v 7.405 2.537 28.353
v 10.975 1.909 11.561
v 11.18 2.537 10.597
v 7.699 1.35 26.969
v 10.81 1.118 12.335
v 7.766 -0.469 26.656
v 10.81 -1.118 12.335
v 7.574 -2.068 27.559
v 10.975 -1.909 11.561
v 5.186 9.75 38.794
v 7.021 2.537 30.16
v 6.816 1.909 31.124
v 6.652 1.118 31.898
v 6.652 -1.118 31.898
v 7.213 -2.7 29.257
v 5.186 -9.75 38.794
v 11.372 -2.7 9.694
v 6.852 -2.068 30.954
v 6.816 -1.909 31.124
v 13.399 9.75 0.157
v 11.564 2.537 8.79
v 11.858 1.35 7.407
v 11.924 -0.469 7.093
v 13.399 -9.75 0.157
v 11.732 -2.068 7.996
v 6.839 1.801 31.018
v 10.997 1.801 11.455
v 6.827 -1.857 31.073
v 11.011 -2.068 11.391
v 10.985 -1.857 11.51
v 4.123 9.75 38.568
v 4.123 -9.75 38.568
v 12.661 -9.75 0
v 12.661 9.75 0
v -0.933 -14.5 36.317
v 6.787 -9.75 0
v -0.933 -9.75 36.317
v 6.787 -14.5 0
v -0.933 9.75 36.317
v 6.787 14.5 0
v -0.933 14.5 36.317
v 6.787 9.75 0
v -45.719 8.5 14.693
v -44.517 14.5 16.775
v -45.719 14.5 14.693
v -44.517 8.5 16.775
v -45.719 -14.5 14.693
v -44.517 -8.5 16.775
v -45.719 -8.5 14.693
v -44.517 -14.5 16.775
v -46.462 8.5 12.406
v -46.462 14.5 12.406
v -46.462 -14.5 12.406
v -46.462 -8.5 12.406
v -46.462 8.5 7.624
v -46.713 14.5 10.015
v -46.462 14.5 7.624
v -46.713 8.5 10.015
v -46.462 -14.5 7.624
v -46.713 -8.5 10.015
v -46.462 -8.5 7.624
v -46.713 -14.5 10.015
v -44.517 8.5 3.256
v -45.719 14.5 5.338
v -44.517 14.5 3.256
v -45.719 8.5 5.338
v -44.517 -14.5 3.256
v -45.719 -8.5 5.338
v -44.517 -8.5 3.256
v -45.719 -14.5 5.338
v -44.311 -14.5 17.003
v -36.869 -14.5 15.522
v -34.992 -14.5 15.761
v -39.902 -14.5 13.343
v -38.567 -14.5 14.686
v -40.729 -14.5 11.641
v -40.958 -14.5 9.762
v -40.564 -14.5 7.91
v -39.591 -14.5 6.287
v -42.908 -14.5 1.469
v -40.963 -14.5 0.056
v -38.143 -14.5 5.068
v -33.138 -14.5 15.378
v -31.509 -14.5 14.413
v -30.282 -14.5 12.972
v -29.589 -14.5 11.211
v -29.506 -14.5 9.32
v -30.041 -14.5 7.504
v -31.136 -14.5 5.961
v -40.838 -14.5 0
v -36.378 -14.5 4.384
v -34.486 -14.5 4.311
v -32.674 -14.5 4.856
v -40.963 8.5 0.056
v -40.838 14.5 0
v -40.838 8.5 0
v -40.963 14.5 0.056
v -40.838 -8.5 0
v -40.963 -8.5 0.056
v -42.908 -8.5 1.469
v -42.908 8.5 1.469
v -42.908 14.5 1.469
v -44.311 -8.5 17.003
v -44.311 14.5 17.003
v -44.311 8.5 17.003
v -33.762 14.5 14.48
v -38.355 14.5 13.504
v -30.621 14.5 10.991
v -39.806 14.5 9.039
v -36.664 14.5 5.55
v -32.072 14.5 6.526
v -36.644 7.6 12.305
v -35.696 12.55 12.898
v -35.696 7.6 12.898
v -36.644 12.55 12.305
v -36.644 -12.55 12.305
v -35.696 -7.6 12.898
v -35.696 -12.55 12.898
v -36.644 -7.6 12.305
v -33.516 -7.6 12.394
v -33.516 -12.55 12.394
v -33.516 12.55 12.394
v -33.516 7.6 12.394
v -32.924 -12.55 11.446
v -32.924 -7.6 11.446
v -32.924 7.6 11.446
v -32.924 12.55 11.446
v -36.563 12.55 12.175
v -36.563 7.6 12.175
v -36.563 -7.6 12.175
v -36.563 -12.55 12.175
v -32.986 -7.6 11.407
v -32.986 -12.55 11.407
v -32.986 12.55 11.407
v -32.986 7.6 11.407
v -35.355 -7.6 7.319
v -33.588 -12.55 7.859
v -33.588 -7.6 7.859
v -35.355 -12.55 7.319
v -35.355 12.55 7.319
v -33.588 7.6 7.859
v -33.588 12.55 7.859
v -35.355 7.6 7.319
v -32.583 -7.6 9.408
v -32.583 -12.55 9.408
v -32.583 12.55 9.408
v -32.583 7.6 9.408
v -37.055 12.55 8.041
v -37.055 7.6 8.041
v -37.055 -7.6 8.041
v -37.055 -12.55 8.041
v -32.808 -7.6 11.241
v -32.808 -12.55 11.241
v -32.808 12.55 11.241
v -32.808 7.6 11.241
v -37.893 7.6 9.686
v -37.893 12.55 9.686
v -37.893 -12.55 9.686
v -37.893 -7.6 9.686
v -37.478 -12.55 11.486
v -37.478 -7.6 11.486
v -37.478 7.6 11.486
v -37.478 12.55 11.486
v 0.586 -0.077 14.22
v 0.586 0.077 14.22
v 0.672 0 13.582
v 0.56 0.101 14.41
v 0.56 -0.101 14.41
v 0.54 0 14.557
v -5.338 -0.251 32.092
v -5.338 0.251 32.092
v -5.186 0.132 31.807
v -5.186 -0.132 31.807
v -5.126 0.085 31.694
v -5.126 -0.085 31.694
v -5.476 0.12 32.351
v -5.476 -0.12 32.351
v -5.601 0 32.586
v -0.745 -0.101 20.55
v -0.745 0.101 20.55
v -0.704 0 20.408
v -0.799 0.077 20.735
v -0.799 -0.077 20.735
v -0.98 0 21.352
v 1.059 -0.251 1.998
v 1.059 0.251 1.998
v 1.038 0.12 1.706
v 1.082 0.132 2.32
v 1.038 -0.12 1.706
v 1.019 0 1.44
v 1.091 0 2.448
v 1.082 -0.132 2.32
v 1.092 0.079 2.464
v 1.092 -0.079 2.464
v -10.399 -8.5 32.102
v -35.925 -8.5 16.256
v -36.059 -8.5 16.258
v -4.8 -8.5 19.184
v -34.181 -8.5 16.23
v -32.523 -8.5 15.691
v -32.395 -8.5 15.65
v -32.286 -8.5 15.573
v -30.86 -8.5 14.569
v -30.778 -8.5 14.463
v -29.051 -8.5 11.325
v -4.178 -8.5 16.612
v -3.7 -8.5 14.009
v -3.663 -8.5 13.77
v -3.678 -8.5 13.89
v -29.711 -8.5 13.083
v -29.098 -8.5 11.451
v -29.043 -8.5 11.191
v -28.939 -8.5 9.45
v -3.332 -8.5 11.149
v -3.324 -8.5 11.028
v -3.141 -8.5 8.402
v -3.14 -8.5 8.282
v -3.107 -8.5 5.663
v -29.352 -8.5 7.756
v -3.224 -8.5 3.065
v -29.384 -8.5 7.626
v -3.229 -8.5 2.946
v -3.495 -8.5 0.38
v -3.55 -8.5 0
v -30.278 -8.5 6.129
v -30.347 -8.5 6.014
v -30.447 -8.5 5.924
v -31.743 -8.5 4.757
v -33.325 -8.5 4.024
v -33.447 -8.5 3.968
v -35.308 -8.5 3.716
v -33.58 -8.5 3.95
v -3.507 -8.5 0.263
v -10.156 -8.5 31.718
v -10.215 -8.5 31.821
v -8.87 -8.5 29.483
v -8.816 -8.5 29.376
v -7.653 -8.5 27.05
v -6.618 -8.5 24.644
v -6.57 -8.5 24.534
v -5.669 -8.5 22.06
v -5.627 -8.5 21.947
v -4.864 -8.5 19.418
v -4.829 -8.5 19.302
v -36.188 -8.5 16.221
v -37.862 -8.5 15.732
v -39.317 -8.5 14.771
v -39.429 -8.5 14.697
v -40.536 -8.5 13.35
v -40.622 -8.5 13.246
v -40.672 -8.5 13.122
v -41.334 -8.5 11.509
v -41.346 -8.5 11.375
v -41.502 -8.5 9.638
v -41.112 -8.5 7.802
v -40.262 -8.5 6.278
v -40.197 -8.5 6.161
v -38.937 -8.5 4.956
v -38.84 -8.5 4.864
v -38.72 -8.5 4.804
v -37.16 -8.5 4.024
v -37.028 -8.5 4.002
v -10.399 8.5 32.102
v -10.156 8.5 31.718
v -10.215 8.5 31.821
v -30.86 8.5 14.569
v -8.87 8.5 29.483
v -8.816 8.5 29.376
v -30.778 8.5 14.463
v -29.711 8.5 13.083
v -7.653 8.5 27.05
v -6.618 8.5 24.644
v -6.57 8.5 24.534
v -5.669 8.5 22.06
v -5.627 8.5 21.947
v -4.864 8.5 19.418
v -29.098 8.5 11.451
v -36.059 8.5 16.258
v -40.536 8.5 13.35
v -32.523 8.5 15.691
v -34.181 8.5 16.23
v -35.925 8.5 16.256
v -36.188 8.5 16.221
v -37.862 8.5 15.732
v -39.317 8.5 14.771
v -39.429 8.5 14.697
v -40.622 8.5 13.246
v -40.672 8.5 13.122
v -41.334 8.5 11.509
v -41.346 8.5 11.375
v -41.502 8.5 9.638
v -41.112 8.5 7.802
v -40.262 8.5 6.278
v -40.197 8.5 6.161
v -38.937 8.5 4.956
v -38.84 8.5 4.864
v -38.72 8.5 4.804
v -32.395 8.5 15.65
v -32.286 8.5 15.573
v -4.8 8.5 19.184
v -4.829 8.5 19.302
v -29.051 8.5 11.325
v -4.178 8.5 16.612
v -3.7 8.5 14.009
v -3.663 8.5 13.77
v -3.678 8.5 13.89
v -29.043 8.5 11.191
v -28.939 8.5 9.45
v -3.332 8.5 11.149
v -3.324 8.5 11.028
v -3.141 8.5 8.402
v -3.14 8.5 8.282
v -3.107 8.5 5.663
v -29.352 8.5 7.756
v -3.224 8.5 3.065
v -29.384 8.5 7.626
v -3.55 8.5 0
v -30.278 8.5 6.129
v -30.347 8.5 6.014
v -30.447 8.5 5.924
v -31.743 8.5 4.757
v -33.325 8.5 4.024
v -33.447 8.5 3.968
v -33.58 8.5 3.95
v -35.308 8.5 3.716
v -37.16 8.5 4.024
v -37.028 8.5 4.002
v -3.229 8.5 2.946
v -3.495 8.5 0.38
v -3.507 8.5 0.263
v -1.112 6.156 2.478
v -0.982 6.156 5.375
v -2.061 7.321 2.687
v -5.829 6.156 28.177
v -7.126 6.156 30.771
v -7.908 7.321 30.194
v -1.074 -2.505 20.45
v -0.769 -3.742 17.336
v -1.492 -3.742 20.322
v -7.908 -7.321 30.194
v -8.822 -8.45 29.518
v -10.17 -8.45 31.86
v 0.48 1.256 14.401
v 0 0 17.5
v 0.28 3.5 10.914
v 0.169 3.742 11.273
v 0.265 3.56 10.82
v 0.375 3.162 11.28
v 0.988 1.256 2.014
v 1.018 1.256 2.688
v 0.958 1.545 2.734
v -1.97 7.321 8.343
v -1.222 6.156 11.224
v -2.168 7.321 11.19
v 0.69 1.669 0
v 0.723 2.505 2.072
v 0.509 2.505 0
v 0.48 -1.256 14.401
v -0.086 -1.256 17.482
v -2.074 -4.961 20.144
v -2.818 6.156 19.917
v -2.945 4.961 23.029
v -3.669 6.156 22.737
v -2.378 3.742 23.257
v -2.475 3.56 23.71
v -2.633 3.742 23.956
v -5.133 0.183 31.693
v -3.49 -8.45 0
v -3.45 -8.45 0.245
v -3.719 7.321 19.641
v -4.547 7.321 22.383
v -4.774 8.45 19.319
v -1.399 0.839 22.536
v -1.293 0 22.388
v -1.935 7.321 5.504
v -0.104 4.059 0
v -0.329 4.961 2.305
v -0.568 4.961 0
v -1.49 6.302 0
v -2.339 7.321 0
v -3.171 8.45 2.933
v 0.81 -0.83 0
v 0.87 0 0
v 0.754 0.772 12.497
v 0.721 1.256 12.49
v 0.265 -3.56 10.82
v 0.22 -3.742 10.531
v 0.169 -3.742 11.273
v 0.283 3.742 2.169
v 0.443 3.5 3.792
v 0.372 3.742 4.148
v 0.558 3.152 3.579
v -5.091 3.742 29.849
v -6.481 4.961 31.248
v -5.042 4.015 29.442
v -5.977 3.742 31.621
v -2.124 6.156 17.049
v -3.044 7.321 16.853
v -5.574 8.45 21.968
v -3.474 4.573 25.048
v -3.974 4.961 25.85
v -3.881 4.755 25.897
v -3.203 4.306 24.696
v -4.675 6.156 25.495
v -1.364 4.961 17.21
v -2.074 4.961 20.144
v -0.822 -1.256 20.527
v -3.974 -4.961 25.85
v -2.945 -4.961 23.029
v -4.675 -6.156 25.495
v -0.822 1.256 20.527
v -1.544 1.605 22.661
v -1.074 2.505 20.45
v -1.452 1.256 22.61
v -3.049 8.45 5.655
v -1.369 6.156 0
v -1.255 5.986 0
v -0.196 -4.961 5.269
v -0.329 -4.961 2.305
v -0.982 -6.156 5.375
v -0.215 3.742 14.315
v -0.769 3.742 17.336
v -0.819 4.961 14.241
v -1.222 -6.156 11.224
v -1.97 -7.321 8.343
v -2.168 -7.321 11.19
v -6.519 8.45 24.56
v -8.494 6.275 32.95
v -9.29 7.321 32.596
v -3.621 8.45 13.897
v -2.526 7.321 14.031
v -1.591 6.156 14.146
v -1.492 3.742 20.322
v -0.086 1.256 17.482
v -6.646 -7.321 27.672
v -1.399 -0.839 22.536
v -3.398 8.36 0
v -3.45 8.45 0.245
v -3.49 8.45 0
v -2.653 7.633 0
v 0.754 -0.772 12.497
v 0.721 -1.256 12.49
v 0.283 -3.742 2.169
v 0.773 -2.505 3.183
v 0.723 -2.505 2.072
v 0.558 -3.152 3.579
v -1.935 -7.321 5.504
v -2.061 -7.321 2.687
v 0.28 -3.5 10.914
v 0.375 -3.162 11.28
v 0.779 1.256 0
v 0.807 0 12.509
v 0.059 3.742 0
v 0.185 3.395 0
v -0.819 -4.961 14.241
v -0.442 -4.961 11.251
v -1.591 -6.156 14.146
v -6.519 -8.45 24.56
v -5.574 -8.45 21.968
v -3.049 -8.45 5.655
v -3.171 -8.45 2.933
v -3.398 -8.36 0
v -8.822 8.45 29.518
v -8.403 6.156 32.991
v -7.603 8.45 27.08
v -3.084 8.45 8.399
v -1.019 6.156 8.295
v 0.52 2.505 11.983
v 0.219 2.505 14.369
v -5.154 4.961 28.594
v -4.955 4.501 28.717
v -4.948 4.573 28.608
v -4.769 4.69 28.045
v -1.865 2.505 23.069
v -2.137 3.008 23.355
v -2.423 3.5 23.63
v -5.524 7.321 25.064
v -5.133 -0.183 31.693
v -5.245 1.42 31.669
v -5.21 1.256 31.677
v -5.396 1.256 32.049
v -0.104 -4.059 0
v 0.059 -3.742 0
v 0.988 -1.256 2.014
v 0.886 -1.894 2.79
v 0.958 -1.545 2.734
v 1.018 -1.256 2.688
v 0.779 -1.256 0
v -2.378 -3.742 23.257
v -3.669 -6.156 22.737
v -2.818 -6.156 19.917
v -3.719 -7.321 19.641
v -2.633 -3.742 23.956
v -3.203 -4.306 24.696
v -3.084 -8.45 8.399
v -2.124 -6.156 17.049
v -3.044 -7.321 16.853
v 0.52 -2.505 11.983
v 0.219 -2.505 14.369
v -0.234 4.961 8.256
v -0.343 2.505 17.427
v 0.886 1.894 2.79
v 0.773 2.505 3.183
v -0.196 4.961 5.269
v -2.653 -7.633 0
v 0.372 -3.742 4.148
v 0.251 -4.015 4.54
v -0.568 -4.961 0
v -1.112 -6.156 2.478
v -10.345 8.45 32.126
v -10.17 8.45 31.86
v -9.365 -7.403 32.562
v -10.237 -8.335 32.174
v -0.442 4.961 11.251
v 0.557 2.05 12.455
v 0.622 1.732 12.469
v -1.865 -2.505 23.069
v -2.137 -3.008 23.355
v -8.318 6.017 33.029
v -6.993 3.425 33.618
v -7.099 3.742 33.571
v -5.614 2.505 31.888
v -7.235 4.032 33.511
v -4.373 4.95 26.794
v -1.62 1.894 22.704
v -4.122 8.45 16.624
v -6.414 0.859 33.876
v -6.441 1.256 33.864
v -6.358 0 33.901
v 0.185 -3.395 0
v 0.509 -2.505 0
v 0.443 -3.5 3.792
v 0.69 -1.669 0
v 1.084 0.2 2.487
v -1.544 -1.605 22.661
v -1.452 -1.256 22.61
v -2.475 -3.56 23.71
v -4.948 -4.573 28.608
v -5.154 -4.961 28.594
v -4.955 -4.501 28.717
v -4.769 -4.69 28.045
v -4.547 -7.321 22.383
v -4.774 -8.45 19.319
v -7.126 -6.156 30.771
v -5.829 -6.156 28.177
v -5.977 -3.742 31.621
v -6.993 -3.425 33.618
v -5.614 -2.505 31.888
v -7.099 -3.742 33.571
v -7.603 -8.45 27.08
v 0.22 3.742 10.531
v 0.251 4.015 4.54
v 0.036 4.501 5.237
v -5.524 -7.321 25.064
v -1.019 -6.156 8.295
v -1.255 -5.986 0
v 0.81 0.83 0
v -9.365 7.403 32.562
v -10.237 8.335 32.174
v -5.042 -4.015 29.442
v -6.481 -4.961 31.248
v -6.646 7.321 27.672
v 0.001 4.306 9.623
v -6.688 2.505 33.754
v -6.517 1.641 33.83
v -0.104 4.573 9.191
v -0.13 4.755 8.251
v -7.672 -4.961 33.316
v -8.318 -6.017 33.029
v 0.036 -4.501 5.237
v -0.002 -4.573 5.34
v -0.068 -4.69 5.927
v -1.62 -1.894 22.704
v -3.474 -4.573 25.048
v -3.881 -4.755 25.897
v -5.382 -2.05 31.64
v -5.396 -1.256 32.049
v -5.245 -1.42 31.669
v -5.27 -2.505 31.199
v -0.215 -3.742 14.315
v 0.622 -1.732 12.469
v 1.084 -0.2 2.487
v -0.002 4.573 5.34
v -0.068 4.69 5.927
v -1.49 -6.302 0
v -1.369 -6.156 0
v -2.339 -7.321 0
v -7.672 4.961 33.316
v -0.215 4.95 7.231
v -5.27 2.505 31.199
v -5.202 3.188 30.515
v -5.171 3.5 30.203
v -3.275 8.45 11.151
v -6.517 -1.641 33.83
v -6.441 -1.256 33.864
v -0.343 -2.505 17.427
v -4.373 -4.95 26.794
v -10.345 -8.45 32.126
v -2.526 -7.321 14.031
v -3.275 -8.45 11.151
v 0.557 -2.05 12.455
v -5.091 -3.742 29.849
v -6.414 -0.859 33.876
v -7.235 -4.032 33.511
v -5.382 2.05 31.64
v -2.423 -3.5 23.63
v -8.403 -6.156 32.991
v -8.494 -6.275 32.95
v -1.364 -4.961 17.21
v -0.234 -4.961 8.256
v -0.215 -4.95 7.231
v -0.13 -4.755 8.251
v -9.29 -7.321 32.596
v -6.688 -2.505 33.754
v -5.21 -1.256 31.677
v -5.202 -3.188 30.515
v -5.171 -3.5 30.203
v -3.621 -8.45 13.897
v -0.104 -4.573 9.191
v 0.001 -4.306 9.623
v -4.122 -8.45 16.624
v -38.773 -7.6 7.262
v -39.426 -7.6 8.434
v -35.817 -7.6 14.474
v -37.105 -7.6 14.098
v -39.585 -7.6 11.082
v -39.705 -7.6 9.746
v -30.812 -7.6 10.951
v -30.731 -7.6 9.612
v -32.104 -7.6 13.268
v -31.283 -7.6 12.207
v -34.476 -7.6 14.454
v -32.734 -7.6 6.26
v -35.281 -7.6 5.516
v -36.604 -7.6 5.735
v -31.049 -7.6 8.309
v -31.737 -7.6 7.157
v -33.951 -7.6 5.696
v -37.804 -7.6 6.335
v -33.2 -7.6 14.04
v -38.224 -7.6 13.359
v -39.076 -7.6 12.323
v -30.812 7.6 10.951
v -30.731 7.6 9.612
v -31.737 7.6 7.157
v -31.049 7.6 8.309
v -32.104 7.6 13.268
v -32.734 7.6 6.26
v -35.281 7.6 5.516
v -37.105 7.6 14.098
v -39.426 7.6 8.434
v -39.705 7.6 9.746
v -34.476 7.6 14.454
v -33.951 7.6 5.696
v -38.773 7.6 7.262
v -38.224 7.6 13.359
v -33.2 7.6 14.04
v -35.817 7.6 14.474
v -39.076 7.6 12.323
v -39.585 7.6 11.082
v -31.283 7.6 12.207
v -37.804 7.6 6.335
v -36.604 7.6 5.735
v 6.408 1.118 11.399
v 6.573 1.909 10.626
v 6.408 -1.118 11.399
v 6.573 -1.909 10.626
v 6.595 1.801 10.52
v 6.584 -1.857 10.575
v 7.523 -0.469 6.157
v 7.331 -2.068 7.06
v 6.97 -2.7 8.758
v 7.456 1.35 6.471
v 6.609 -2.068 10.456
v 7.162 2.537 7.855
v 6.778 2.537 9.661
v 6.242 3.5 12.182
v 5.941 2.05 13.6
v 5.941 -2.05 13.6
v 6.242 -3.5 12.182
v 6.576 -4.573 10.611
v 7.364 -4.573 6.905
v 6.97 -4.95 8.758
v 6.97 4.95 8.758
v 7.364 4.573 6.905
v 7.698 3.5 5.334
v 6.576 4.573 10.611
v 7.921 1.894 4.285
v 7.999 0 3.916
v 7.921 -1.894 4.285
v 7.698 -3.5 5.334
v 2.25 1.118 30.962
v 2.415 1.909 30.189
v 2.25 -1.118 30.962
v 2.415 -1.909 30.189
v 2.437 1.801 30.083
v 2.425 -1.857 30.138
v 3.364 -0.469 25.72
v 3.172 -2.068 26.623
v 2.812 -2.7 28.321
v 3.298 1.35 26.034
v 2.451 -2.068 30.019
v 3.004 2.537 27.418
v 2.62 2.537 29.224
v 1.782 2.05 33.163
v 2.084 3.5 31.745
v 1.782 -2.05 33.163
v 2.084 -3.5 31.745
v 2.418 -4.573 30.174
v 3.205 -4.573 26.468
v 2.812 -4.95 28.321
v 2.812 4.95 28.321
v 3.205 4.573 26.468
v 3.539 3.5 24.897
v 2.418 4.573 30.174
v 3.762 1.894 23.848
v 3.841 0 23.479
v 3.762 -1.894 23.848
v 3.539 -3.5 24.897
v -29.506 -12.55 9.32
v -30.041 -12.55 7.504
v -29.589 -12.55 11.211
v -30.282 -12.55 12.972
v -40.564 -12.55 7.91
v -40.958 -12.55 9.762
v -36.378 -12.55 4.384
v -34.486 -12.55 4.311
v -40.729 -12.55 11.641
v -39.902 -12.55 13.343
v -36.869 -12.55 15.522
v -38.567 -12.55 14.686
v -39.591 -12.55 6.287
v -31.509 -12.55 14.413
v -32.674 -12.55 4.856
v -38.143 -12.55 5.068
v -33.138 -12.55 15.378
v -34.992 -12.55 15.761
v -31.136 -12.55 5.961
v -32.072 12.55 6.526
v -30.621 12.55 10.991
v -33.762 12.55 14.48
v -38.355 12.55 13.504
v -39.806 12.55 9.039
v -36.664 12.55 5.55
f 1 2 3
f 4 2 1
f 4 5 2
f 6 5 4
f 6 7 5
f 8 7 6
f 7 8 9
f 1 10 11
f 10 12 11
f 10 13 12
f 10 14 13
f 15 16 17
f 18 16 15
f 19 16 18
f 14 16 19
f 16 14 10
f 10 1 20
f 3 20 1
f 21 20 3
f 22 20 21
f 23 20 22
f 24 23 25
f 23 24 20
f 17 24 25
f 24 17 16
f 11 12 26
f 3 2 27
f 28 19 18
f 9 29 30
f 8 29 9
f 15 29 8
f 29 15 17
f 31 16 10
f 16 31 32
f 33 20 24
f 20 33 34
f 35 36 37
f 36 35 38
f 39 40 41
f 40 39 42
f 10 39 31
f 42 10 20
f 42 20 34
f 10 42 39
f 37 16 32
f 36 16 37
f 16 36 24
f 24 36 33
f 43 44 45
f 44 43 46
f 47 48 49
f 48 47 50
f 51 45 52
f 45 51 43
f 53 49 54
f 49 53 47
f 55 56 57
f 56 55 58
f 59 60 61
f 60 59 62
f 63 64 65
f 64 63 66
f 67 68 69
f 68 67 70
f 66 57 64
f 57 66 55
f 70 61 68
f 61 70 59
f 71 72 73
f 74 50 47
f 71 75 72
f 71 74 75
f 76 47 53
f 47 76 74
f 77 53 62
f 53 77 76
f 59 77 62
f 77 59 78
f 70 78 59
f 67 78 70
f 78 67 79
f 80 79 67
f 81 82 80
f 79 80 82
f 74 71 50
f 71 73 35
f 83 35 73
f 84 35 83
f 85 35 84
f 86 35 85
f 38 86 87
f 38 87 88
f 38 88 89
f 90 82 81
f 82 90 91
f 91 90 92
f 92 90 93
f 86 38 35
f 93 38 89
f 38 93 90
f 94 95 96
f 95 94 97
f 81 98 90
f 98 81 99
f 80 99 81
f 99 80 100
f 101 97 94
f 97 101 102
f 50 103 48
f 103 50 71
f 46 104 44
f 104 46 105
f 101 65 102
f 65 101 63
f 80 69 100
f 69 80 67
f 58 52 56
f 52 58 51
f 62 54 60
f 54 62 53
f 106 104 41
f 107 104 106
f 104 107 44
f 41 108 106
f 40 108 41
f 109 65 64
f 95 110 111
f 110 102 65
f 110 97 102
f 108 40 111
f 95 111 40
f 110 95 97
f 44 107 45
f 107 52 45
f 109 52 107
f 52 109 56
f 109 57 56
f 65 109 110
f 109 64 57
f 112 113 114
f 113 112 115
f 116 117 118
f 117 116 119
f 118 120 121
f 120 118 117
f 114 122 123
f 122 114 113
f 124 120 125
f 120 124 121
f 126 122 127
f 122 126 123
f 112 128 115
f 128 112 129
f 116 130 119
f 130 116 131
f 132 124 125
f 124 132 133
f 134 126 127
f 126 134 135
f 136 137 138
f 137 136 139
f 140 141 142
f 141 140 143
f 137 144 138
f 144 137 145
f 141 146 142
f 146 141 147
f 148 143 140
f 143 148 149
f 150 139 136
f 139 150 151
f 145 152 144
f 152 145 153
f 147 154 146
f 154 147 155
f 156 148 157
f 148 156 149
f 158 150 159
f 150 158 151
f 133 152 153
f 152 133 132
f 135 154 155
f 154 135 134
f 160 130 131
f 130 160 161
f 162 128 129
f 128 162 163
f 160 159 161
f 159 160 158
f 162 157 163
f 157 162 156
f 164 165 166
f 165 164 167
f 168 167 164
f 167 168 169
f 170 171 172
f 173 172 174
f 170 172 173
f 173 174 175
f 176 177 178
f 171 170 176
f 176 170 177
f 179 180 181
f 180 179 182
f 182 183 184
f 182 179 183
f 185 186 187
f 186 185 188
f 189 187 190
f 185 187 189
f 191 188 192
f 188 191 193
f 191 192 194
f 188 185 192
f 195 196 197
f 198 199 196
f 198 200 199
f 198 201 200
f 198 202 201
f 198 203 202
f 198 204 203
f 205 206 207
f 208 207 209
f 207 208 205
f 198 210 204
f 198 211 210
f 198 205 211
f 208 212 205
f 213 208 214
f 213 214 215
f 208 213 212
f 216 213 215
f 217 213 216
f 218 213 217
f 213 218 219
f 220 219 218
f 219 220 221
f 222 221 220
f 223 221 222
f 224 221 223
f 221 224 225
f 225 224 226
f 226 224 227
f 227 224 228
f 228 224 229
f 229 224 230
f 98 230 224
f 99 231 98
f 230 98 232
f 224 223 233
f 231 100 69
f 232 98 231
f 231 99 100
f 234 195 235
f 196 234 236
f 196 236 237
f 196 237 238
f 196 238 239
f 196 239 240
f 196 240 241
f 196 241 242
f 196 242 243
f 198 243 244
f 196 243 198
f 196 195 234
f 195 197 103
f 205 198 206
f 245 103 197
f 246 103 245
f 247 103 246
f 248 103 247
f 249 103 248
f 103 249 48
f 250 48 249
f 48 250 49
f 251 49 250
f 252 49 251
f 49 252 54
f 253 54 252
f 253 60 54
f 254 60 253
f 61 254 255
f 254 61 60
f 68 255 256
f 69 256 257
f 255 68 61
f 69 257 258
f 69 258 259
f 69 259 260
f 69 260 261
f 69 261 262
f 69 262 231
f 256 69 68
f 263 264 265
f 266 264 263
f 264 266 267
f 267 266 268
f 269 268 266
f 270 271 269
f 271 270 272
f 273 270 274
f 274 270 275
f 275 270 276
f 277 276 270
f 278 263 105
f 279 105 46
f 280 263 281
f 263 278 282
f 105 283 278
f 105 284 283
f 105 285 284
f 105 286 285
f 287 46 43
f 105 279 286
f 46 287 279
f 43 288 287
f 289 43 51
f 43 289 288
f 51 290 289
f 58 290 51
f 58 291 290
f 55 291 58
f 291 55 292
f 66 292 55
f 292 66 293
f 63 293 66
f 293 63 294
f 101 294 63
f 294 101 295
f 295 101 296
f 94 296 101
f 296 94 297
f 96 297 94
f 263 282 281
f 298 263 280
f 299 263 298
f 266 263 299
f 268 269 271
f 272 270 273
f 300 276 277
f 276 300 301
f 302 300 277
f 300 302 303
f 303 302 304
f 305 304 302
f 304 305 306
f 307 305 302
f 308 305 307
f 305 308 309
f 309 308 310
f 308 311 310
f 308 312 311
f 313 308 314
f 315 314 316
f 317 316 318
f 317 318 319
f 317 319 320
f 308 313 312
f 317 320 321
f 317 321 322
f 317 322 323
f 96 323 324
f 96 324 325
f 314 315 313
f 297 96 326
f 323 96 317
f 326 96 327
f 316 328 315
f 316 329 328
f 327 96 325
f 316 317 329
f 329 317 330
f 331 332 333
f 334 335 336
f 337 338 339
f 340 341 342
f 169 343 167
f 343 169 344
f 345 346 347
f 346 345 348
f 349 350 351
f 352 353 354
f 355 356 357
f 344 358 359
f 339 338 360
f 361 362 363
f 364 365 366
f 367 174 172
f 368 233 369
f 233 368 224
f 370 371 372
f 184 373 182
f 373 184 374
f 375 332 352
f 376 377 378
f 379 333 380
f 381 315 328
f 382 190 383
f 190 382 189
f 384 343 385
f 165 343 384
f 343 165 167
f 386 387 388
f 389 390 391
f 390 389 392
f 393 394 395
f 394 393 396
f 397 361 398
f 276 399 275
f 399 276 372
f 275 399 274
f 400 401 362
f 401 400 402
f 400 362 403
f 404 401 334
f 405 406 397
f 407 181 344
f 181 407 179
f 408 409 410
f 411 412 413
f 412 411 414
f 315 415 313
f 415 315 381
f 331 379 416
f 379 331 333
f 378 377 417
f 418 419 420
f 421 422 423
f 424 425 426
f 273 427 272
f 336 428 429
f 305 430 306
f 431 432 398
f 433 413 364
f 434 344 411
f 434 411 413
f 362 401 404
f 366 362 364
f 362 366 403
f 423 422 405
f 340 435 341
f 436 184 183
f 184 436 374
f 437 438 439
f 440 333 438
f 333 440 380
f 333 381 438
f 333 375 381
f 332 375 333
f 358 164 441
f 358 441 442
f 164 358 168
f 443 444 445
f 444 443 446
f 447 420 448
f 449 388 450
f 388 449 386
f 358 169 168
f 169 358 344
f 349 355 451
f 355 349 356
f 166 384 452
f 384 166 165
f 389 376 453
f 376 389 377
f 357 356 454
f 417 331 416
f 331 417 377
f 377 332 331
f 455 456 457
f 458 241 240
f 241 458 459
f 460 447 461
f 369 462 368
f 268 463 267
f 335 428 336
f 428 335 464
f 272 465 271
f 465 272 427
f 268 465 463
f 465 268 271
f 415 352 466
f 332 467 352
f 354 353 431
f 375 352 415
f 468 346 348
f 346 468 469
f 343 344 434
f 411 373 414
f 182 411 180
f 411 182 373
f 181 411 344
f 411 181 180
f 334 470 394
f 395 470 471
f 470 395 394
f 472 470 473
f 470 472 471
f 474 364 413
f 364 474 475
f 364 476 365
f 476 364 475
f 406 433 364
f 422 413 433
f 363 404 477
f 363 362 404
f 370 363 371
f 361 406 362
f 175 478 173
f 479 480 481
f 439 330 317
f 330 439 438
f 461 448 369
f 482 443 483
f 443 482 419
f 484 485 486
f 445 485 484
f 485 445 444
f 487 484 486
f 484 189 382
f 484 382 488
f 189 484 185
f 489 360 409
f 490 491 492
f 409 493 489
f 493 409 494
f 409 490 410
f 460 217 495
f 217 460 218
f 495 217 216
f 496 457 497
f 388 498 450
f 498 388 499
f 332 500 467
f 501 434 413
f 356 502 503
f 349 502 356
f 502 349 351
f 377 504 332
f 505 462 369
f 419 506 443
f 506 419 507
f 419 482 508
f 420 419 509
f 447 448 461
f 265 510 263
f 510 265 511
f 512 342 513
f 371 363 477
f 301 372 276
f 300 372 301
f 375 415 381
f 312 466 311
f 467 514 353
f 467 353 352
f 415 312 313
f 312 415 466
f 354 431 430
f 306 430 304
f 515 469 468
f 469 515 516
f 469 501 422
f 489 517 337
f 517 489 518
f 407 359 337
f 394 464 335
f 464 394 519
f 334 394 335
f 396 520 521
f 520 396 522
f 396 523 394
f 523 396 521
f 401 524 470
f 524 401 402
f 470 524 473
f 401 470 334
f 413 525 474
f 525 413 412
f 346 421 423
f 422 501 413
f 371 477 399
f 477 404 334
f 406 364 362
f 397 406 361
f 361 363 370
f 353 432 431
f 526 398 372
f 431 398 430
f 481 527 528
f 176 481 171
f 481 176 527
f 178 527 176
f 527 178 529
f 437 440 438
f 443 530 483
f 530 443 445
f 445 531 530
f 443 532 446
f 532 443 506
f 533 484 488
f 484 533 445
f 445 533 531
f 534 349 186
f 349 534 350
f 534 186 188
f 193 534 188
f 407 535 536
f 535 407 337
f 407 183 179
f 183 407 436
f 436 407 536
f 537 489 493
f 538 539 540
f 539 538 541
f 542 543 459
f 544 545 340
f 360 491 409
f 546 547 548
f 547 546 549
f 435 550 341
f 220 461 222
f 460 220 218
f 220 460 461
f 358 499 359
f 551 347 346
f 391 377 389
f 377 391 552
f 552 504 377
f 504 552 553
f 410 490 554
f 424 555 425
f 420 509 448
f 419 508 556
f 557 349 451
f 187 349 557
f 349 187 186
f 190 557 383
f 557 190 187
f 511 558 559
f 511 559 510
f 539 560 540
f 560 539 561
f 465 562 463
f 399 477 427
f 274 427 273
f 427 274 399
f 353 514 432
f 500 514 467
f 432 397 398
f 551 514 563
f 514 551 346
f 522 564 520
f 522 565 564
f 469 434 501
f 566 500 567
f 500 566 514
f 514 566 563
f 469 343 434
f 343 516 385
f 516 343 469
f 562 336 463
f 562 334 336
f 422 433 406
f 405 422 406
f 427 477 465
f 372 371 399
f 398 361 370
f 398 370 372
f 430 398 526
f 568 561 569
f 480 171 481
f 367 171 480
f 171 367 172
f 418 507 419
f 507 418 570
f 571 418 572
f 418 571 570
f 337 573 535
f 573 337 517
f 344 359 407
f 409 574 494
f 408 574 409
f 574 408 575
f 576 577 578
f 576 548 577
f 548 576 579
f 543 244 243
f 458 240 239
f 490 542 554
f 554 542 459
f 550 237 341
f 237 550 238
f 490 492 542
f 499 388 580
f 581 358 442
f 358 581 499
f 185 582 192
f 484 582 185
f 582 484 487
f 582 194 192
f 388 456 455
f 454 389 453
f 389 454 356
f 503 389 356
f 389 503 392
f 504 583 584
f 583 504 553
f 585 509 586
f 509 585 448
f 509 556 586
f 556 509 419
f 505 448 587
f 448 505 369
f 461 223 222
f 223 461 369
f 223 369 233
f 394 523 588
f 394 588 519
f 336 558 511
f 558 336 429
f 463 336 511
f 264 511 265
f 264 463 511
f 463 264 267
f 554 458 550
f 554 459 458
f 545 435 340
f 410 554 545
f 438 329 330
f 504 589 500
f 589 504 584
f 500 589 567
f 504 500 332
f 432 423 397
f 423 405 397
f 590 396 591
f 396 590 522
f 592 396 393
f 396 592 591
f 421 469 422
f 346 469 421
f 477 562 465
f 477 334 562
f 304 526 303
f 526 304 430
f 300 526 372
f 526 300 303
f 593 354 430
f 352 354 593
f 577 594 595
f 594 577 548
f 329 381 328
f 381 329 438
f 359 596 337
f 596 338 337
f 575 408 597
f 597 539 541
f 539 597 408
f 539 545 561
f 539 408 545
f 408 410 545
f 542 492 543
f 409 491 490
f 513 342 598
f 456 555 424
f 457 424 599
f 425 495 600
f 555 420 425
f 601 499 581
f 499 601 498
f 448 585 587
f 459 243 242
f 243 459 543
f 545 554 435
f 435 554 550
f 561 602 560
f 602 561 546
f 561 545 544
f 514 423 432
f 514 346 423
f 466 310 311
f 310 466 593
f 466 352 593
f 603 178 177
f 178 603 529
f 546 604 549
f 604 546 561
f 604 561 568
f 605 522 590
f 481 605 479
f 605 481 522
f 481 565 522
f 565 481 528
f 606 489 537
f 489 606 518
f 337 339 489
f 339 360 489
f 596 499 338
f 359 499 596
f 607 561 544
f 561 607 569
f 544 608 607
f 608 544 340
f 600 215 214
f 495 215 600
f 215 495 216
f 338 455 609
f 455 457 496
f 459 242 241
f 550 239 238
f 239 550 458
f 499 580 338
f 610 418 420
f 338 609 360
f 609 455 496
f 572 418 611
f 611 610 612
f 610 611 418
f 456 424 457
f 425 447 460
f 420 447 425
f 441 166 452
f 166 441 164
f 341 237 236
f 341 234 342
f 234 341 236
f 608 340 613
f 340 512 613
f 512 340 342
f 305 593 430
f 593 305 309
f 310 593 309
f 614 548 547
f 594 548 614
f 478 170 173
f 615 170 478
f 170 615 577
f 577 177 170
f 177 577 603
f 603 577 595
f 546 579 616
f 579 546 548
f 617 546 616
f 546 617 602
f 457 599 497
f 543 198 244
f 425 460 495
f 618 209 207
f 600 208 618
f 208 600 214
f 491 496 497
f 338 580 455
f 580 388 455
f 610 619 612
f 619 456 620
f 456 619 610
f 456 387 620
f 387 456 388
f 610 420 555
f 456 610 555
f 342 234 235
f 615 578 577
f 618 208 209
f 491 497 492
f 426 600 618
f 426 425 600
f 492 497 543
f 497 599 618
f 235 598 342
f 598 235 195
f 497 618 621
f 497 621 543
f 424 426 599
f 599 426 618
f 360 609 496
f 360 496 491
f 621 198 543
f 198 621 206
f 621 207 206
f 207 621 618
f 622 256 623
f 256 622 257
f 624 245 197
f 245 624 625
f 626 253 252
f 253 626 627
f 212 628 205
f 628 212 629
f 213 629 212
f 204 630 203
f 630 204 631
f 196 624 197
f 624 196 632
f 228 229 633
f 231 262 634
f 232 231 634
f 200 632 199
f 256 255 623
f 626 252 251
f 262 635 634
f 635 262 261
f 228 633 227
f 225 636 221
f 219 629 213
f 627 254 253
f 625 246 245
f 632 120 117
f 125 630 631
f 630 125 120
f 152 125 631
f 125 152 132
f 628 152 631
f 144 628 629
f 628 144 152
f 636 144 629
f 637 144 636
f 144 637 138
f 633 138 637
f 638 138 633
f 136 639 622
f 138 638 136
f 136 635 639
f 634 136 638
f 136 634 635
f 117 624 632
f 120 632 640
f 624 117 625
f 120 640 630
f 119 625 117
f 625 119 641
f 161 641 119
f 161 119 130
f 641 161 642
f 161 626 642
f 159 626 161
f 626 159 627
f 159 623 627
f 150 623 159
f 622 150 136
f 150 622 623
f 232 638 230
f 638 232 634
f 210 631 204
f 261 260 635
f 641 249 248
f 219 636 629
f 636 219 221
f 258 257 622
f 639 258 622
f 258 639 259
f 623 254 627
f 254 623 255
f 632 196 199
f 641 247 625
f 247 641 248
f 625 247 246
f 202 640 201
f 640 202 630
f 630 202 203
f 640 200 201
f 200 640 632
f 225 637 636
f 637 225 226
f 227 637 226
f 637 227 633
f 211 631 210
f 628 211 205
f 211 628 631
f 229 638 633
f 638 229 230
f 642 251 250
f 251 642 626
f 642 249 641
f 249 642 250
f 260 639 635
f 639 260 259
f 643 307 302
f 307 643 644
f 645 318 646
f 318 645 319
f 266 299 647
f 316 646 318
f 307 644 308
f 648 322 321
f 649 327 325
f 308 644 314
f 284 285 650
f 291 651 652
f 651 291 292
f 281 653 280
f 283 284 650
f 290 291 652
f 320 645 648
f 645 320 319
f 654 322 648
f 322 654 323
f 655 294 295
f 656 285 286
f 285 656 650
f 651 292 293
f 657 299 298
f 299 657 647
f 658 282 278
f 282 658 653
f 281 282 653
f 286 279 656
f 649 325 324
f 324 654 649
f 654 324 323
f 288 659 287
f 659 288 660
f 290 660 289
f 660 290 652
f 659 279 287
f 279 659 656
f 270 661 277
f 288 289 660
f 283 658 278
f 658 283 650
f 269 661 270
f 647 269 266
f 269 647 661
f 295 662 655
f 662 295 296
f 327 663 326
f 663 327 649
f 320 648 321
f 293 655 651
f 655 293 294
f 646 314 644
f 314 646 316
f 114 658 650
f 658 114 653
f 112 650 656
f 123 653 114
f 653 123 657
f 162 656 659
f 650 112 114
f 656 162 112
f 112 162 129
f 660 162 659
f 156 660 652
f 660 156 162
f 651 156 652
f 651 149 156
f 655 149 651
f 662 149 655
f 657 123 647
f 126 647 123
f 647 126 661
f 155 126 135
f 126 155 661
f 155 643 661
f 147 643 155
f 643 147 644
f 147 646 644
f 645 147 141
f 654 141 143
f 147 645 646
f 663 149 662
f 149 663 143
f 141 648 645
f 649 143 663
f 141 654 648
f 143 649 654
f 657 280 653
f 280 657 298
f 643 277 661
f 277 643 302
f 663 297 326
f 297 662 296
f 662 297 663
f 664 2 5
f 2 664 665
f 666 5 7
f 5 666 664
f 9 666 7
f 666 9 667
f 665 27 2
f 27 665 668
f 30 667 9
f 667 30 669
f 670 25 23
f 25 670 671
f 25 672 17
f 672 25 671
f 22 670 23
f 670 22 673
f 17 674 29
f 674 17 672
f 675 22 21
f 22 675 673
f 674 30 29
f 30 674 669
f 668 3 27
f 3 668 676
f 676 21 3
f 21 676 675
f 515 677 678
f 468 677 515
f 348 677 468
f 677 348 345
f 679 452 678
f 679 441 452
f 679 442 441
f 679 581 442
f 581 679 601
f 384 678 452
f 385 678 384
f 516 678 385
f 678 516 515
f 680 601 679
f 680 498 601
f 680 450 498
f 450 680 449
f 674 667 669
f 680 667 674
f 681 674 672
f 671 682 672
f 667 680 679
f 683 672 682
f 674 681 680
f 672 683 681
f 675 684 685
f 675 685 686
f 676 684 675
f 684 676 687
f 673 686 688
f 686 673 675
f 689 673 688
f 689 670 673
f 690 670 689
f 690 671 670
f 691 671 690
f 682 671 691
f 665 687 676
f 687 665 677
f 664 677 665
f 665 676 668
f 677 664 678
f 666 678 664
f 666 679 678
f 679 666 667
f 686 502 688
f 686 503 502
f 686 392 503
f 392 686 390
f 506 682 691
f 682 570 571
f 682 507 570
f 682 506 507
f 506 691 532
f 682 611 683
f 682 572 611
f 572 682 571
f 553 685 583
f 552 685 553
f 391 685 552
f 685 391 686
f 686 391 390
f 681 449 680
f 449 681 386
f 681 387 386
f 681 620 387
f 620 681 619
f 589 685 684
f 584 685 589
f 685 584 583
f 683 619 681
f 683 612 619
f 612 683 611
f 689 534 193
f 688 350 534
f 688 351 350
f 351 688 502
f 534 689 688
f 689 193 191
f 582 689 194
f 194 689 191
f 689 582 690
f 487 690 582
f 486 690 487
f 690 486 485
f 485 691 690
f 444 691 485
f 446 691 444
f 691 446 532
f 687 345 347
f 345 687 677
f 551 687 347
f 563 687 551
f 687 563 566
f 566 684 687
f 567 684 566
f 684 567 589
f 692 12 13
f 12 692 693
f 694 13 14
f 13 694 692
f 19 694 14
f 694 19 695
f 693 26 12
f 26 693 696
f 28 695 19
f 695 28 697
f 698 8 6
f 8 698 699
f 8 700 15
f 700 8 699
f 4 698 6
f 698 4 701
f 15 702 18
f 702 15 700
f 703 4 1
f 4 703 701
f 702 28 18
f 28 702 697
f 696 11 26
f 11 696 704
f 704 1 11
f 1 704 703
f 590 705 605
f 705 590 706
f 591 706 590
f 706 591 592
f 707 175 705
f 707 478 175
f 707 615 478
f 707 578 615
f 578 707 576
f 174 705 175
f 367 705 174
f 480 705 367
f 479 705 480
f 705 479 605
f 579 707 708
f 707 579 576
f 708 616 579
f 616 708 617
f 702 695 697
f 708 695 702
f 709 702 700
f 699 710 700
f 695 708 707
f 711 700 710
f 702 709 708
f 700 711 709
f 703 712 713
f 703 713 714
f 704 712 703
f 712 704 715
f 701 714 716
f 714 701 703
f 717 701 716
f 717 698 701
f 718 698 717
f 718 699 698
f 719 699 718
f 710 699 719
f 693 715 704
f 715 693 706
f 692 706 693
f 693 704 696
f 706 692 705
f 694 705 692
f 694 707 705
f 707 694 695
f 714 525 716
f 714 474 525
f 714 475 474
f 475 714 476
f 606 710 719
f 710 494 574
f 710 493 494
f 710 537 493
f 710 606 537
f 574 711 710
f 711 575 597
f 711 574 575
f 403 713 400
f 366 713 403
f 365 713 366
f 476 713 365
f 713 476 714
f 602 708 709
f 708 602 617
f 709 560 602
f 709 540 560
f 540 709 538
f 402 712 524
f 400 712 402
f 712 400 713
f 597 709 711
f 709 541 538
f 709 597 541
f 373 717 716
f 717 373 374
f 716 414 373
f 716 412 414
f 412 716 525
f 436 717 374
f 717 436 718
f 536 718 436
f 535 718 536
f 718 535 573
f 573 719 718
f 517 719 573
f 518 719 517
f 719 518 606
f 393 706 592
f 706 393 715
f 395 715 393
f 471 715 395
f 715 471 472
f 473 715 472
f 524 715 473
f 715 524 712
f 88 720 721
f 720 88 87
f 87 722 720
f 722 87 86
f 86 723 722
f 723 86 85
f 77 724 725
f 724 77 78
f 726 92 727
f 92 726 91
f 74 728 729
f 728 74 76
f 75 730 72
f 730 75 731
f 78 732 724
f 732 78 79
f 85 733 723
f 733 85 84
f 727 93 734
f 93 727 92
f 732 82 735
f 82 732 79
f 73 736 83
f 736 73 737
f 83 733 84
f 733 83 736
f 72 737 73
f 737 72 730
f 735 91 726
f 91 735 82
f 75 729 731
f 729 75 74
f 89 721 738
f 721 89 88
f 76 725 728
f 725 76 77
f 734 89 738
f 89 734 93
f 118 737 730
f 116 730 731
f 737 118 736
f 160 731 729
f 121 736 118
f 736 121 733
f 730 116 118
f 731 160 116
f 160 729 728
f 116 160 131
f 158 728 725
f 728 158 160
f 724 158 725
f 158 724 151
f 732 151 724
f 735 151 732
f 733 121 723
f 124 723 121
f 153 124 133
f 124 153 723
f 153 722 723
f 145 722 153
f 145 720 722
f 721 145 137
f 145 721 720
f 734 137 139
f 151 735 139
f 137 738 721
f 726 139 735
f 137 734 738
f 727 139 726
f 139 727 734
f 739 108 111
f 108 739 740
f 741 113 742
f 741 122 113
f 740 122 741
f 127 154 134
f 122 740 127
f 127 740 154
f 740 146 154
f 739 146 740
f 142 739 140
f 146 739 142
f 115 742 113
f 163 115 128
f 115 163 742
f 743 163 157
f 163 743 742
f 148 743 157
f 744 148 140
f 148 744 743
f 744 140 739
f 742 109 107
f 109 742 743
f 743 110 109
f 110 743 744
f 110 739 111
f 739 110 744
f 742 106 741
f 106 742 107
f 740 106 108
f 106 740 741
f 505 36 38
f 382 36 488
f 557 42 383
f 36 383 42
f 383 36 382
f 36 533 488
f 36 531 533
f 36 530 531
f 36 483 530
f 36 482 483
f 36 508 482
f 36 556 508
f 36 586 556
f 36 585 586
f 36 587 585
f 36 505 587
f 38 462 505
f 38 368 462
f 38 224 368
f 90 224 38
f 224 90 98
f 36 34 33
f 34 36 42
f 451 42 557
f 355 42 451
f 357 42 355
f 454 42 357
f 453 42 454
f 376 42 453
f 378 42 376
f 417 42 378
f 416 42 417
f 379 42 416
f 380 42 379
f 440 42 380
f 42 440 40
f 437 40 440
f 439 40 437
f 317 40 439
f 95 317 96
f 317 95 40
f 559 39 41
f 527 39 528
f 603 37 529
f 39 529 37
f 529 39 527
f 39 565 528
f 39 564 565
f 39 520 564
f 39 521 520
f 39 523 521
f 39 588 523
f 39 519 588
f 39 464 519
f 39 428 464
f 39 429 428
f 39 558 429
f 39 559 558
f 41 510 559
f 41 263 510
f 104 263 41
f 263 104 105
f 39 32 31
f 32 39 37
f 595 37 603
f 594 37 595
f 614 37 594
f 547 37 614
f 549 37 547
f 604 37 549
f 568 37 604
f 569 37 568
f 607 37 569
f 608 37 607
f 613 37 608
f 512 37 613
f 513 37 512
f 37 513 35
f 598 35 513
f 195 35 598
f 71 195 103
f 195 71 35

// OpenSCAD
slop = .2;

m5_nut_rad = 8.79/2+slop;
m5_nut_height = 4.7;
m5_rad = 5/2+slop;
m5_dia = 5+slop;
m5_cap_rad = 9/2+slop;
m5_washer_rad = 11/2;

wall = 6;

//%cylinder(r=m8_washer_rad,h=20);
//%rotate([90,0,0])translate([-34.5,13,-2]) cylinder(r=m8_rad, h=30, center=true);

//the wheel
//translate([-31,T/2,9]) rotate([90,0,0]) //this puts the wheel in the carrier
*wheel();

//the carrier
//rotated for printing
difference(){
	translate([0,0,17.5]) rotate([0,-12,0])
	carrier();
	translate([0,0,-50]) cube([100,100,100], center=true);
    
    translate([0,0,-18]) rotate([0,-24,0])
    translate([0,0,100]) cube([100,100,100], center=true);
}

module carrier(){
	thickness = wall+wall+1+1+T;
	difference(){
		union(){
            //extra base clearance
            translate([6.25,0,0]) cube([6.5, 19.5, 39.5], center=true);
            
			hull(){
				cube([wall, thickness, 40], center=true);
				
				translate([-D/2-wall,0,0]) rotate([90,0,0]) cylinder(r=m5_washer_rad+wall, h=thickness, center=true);
			}
		}

		//mount the wheel
		translate([-D/2-wall,0,0]) rotate([-90,0,0]) {
			rotate([0,0,25]) cap_cylinder(r=m5_rad, h=50, center=true);
			difference(){
				scale([1,1.25,1]) intersection(){
					cylinder(r=D/2+wall,h=T+2,center=true,$fn=100);
					scale([1,1,.5]) sphere(r=D/2+wall, $fn=90);
				}
                
				//bumps to hold the wheel centered
				for(i=[0,1]) mirror([0,0,i]) translate([0,0,-T/2-1.1]) cylinder(r1=m5_washer_rad+1, r2=m5_washer_rad-1, h=1);
			}
		}
		
		//bolt indent
		translate([-D/2-wall,0,0])rotate([-90,0,0]) translate([0,0,-T/2-1.05-wall]) cylinder(r=m5_washer_rad+.25, h=2);
		//nut indent
		mirror([0,1,0]) translate([-D/2-wall,0,0])rotate([-90,0,0]) translate([0,0,-T/2-1.05-wall]) cylinder(r=m5_nut_rad+.1, h=2, $fn=6);

		//mount the carrier
		for(i=[-10,10]) translate([0,0,i]) rotate([0,90,0]){
			rotate([0,0,-90]) cap_cylinder(r=m5_rad, h=30, center=true);
			translate([0,0,-30]) rotate([0,0,-90]) cap_cylinder(r=m5_cap_rad+.25, h=35);
		}
	}
}

// outer diameter of ring
D=60;
// thickness
T=15;
// clearance
tol=.3;
number_of_planets=6;
number_of_teeth_on_planets=5;
approximate_number_of_teeth_on_sun=11;
// pressure angle
P=45;//[30:60]
// number of teeth to twist across
nTwist=1;
// width of center hole
w=m5_dia+slop;

DR=0.5*1;// maximum depth ratio of teeth

m=round(number_of_planets);
np=round(number_of_teeth_on_planets);
ns1=approximate_number_of_teeth_on_sun;
k1=round(2/m*(ns1+np));
k= k1*m%2!=0 ? k1+1 : k1;
ns=k*m/2-np;
echo(ns);
nr=ns+2*np;
pitchD=0.9*D/(1+min(PI/(2*nr*tan(P)),PI*DR/nr));
pitch=pitchD*PI/nr;
echo(pitch);
helix_angle=atan(2*nTwist*pitch/T);
echo(helix_angle);

phi=$t*360/m;
module wheel(){
	translate([0,0,T/2]){
		difference(){
			intersection(){
				cylinder(r=D/2+1,h=T,center=true,$fn=100);
				scale([1,1,.8]) sphere(r=D/2+1, $fn=90);
			}
			render() herringbone(nr,pitch,P,DR,-tol,helix_angle,T+0.2);
		}
		rotate([0,0,(np+1)*180/ns+phi*(ns+np)*2/ns])
		difference(){
			mirror([0,1,0])
				render() herringbone(ns,pitch,P,DR,tol,helix_angle,T);
			cylinder(r=w/2,h=T+1,center=true);
		}
		for(i=[1:m])rotate([0,0,i*360/m+phi])translate([pitchD/2*(ns+np)/nr,0,0])
			render() rotate([0,0,i*ns/m*360/np-phi*(ns+np)/np-phi])
				herringbone(np,pitch,P,DR,tol,helix_angle,T);
	}
}

module rack(
	number_of_teeth=15,
	circular_pitch=10,
	pressure_angle=28,
	helix_angle=0,
	clearance=0,
	gear_thickness=5,
	flat=false){
addendum=circular_pitch/(4*tan(pressure_angle));

flat_extrude(h=gear_thickness,flat=flat)translate([0,-clearance*cos(pressure_angle)/2])
	union(){
		translate([0,-0.5-addendum])square([number_of_teeth*circular_pitch,1],center=true);
		for(i=[1:number_of_teeth])
			translate([circular_pitch*(i-number_of_teeth/2-0.5),0])
			polygon(points=[[-circular_pitch/2,-addendum],[circular_pitch/2,-addendum],[0,addendum]]);
	}
}

module herringbone(
	number_of_teeth=15,
	circular_pitch=10,
	pressure_angle=28,
	depth_ratio=1,
	clearance=0,
	helix_angle=0,
	gear_thickness=5){
union(){
	gear(number_of_teeth,
		circular_pitch,
		pressure_angle,
		depth_ratio,
		clearance,
		helix_angle,
		gear_thickness/2);
	mirror([0,0,1])
		gear(number_of_teeth,
			circular_pitch,
			pressure_angle,
			depth_ratio,
			clearance,
			helix_angle,
			gear_thickness/2);
}}

module gear (
	number_of_teeth=15,
	circular_pitch=10,
	pressure_angle=28,
	depth_ratio=1,
	clearance=0,
	helix_angle=0,
	gear_thickness=5,
	flat=false){
pitch_radius = number_of_teeth*circular_pitch/(2*PI);
twist=tan(helix_angle)*gear_thickness/pitch_radius*180/PI;

flat_extrude(h=gear_thickness,twist=twist,flat=flat)
	gear2D (
		number_of_teeth,
		circular_pitch,
		pressure_angle,
		depth_ratio,
		clearance);
}

module flat_extrude(h,twist,flat){
	if(flat==false)
		linear_extrude(height=h,twist=twist,slices=twist/6)child(0);
	else
		child(0);
}

module gear2D (
	number_of_teeth,
	circular_pitch,
	pressure_angle,
	depth_ratio,
	clearance){
pitch_radius = number_of_teeth*circular_pitch/(2*PI);
base_radius = pitch_radius*cos(pressure_angle);
depth=circular_pitch/(2*tan(pressure_angle));
outer_radius = clearance<0 ? pitch_radius+depth/2-clearance : pitch_radius+depth/2;
root_radius1 = pitch_radius-depth/2-clearance/2;
root_radius = (clearance<0 && root_radius1<base_radius) ? base_radius : root_radius1;
backlash_angle = clearance/(pitch_radius*cos(pressure_angle)) * 180 / PI;
half_thick_angle = 90/number_of_teeth - backlash_angle/2;
pitch_point = involute (base_radius, involute_intersect_angle (base_radius, pitch_radius));
pitch_angle = atan2 (pitch_point[1], pitch_point[0]);
min_radius = max (base_radius,root_radius);

intersection(){
	rotate(90/number_of_teeth)
		circle($fn=number_of_teeth*3,r=pitch_radius+depth_ratio*circular_pitch/2-clearance/2);
	union(){
		rotate(90/number_of_teeth)
			circle($fn=number_of_teeth*2,r=max(root_radius,pitch_radius-depth_ratio*circular_pitch/2-clearance/2));
		for (i = [1:number_of_teeth])rotate(i*360/number_of_teeth){
			halftooth (
				pitch_angle,
				base_radius,
				min_radius,
				outer_radius,
				half_thick_angle);		
			mirror([0,1])halftooth (
				pitch_angle,
				base_radius,
				min_radius,
				outer_radius,
				half_thick_angle);
		}
	}
}}

module halftooth (
	pitch_angle,
	base_radius,
	min_radius,
	outer_radius,
	half_thick_angle){
index=[0,1,2,3,4,5];
start_angle = max(involute_intersect_angle (base_radius, min_radius)-5,0);
stop_angle = involute_intersect_angle (base_radius, outer_radius);
angle=index*(stop_angle-start_angle)/index[len(index)-1];
p=[[0,0],
	involute(base_radius,angle[0]+start_angle),
	involute(base_radius,angle[1]+start_angle),
	involute(base_radius,angle[2]+start_angle),
	involute(base_radius,angle[3]+start_angle),
	involute(base_radius,angle[4]+start_angle),
	involute(base_radius,angle[5]+start_angle)];

difference(){
	rotate(-pitch_angle-half_thick_angle)polygon(points=p);
	square(2*outer_radius);
}}

// Mathematical Functions
//===============

// Finds the angle of the involute about the base radius at the given distance (radius) from it's center.
//source: http://www.mathhelpforum.com/math-help/geometry/136011-circle-involute-solving-y-any-given-x.html

function involute_intersect_angle (base_radius, radius) = sqrt (pow (radius/base_radius, 2) - 1) * 180 / PI;

// Calculate the involute position for a given base radius and involute angle.

function involute (base_radius, involute_angle) =
[
	base_radius*(cos (involute_angle) + involute_angle*PI/180*sin (involute_angle)),
	base_radius*(sin (involute_angle) - involute_angle*PI/180*cos (involute_angle))
];

module cap_cylinder(r=1, h=1, center=false){
	render() union() {
		cylinder(r=r, h=h, center=center);
		intersection(){
			rotate([0,0,22.5]) cylinder(r=r/cos(180/8), h=h, $fn=8, center=center);
			translate([0,-r/cos(180/4),0]) rotate([0,0,0]) cylinder(r=r/cos(180/4), h=h, $fn=4, center=center);
		}
	}
}
